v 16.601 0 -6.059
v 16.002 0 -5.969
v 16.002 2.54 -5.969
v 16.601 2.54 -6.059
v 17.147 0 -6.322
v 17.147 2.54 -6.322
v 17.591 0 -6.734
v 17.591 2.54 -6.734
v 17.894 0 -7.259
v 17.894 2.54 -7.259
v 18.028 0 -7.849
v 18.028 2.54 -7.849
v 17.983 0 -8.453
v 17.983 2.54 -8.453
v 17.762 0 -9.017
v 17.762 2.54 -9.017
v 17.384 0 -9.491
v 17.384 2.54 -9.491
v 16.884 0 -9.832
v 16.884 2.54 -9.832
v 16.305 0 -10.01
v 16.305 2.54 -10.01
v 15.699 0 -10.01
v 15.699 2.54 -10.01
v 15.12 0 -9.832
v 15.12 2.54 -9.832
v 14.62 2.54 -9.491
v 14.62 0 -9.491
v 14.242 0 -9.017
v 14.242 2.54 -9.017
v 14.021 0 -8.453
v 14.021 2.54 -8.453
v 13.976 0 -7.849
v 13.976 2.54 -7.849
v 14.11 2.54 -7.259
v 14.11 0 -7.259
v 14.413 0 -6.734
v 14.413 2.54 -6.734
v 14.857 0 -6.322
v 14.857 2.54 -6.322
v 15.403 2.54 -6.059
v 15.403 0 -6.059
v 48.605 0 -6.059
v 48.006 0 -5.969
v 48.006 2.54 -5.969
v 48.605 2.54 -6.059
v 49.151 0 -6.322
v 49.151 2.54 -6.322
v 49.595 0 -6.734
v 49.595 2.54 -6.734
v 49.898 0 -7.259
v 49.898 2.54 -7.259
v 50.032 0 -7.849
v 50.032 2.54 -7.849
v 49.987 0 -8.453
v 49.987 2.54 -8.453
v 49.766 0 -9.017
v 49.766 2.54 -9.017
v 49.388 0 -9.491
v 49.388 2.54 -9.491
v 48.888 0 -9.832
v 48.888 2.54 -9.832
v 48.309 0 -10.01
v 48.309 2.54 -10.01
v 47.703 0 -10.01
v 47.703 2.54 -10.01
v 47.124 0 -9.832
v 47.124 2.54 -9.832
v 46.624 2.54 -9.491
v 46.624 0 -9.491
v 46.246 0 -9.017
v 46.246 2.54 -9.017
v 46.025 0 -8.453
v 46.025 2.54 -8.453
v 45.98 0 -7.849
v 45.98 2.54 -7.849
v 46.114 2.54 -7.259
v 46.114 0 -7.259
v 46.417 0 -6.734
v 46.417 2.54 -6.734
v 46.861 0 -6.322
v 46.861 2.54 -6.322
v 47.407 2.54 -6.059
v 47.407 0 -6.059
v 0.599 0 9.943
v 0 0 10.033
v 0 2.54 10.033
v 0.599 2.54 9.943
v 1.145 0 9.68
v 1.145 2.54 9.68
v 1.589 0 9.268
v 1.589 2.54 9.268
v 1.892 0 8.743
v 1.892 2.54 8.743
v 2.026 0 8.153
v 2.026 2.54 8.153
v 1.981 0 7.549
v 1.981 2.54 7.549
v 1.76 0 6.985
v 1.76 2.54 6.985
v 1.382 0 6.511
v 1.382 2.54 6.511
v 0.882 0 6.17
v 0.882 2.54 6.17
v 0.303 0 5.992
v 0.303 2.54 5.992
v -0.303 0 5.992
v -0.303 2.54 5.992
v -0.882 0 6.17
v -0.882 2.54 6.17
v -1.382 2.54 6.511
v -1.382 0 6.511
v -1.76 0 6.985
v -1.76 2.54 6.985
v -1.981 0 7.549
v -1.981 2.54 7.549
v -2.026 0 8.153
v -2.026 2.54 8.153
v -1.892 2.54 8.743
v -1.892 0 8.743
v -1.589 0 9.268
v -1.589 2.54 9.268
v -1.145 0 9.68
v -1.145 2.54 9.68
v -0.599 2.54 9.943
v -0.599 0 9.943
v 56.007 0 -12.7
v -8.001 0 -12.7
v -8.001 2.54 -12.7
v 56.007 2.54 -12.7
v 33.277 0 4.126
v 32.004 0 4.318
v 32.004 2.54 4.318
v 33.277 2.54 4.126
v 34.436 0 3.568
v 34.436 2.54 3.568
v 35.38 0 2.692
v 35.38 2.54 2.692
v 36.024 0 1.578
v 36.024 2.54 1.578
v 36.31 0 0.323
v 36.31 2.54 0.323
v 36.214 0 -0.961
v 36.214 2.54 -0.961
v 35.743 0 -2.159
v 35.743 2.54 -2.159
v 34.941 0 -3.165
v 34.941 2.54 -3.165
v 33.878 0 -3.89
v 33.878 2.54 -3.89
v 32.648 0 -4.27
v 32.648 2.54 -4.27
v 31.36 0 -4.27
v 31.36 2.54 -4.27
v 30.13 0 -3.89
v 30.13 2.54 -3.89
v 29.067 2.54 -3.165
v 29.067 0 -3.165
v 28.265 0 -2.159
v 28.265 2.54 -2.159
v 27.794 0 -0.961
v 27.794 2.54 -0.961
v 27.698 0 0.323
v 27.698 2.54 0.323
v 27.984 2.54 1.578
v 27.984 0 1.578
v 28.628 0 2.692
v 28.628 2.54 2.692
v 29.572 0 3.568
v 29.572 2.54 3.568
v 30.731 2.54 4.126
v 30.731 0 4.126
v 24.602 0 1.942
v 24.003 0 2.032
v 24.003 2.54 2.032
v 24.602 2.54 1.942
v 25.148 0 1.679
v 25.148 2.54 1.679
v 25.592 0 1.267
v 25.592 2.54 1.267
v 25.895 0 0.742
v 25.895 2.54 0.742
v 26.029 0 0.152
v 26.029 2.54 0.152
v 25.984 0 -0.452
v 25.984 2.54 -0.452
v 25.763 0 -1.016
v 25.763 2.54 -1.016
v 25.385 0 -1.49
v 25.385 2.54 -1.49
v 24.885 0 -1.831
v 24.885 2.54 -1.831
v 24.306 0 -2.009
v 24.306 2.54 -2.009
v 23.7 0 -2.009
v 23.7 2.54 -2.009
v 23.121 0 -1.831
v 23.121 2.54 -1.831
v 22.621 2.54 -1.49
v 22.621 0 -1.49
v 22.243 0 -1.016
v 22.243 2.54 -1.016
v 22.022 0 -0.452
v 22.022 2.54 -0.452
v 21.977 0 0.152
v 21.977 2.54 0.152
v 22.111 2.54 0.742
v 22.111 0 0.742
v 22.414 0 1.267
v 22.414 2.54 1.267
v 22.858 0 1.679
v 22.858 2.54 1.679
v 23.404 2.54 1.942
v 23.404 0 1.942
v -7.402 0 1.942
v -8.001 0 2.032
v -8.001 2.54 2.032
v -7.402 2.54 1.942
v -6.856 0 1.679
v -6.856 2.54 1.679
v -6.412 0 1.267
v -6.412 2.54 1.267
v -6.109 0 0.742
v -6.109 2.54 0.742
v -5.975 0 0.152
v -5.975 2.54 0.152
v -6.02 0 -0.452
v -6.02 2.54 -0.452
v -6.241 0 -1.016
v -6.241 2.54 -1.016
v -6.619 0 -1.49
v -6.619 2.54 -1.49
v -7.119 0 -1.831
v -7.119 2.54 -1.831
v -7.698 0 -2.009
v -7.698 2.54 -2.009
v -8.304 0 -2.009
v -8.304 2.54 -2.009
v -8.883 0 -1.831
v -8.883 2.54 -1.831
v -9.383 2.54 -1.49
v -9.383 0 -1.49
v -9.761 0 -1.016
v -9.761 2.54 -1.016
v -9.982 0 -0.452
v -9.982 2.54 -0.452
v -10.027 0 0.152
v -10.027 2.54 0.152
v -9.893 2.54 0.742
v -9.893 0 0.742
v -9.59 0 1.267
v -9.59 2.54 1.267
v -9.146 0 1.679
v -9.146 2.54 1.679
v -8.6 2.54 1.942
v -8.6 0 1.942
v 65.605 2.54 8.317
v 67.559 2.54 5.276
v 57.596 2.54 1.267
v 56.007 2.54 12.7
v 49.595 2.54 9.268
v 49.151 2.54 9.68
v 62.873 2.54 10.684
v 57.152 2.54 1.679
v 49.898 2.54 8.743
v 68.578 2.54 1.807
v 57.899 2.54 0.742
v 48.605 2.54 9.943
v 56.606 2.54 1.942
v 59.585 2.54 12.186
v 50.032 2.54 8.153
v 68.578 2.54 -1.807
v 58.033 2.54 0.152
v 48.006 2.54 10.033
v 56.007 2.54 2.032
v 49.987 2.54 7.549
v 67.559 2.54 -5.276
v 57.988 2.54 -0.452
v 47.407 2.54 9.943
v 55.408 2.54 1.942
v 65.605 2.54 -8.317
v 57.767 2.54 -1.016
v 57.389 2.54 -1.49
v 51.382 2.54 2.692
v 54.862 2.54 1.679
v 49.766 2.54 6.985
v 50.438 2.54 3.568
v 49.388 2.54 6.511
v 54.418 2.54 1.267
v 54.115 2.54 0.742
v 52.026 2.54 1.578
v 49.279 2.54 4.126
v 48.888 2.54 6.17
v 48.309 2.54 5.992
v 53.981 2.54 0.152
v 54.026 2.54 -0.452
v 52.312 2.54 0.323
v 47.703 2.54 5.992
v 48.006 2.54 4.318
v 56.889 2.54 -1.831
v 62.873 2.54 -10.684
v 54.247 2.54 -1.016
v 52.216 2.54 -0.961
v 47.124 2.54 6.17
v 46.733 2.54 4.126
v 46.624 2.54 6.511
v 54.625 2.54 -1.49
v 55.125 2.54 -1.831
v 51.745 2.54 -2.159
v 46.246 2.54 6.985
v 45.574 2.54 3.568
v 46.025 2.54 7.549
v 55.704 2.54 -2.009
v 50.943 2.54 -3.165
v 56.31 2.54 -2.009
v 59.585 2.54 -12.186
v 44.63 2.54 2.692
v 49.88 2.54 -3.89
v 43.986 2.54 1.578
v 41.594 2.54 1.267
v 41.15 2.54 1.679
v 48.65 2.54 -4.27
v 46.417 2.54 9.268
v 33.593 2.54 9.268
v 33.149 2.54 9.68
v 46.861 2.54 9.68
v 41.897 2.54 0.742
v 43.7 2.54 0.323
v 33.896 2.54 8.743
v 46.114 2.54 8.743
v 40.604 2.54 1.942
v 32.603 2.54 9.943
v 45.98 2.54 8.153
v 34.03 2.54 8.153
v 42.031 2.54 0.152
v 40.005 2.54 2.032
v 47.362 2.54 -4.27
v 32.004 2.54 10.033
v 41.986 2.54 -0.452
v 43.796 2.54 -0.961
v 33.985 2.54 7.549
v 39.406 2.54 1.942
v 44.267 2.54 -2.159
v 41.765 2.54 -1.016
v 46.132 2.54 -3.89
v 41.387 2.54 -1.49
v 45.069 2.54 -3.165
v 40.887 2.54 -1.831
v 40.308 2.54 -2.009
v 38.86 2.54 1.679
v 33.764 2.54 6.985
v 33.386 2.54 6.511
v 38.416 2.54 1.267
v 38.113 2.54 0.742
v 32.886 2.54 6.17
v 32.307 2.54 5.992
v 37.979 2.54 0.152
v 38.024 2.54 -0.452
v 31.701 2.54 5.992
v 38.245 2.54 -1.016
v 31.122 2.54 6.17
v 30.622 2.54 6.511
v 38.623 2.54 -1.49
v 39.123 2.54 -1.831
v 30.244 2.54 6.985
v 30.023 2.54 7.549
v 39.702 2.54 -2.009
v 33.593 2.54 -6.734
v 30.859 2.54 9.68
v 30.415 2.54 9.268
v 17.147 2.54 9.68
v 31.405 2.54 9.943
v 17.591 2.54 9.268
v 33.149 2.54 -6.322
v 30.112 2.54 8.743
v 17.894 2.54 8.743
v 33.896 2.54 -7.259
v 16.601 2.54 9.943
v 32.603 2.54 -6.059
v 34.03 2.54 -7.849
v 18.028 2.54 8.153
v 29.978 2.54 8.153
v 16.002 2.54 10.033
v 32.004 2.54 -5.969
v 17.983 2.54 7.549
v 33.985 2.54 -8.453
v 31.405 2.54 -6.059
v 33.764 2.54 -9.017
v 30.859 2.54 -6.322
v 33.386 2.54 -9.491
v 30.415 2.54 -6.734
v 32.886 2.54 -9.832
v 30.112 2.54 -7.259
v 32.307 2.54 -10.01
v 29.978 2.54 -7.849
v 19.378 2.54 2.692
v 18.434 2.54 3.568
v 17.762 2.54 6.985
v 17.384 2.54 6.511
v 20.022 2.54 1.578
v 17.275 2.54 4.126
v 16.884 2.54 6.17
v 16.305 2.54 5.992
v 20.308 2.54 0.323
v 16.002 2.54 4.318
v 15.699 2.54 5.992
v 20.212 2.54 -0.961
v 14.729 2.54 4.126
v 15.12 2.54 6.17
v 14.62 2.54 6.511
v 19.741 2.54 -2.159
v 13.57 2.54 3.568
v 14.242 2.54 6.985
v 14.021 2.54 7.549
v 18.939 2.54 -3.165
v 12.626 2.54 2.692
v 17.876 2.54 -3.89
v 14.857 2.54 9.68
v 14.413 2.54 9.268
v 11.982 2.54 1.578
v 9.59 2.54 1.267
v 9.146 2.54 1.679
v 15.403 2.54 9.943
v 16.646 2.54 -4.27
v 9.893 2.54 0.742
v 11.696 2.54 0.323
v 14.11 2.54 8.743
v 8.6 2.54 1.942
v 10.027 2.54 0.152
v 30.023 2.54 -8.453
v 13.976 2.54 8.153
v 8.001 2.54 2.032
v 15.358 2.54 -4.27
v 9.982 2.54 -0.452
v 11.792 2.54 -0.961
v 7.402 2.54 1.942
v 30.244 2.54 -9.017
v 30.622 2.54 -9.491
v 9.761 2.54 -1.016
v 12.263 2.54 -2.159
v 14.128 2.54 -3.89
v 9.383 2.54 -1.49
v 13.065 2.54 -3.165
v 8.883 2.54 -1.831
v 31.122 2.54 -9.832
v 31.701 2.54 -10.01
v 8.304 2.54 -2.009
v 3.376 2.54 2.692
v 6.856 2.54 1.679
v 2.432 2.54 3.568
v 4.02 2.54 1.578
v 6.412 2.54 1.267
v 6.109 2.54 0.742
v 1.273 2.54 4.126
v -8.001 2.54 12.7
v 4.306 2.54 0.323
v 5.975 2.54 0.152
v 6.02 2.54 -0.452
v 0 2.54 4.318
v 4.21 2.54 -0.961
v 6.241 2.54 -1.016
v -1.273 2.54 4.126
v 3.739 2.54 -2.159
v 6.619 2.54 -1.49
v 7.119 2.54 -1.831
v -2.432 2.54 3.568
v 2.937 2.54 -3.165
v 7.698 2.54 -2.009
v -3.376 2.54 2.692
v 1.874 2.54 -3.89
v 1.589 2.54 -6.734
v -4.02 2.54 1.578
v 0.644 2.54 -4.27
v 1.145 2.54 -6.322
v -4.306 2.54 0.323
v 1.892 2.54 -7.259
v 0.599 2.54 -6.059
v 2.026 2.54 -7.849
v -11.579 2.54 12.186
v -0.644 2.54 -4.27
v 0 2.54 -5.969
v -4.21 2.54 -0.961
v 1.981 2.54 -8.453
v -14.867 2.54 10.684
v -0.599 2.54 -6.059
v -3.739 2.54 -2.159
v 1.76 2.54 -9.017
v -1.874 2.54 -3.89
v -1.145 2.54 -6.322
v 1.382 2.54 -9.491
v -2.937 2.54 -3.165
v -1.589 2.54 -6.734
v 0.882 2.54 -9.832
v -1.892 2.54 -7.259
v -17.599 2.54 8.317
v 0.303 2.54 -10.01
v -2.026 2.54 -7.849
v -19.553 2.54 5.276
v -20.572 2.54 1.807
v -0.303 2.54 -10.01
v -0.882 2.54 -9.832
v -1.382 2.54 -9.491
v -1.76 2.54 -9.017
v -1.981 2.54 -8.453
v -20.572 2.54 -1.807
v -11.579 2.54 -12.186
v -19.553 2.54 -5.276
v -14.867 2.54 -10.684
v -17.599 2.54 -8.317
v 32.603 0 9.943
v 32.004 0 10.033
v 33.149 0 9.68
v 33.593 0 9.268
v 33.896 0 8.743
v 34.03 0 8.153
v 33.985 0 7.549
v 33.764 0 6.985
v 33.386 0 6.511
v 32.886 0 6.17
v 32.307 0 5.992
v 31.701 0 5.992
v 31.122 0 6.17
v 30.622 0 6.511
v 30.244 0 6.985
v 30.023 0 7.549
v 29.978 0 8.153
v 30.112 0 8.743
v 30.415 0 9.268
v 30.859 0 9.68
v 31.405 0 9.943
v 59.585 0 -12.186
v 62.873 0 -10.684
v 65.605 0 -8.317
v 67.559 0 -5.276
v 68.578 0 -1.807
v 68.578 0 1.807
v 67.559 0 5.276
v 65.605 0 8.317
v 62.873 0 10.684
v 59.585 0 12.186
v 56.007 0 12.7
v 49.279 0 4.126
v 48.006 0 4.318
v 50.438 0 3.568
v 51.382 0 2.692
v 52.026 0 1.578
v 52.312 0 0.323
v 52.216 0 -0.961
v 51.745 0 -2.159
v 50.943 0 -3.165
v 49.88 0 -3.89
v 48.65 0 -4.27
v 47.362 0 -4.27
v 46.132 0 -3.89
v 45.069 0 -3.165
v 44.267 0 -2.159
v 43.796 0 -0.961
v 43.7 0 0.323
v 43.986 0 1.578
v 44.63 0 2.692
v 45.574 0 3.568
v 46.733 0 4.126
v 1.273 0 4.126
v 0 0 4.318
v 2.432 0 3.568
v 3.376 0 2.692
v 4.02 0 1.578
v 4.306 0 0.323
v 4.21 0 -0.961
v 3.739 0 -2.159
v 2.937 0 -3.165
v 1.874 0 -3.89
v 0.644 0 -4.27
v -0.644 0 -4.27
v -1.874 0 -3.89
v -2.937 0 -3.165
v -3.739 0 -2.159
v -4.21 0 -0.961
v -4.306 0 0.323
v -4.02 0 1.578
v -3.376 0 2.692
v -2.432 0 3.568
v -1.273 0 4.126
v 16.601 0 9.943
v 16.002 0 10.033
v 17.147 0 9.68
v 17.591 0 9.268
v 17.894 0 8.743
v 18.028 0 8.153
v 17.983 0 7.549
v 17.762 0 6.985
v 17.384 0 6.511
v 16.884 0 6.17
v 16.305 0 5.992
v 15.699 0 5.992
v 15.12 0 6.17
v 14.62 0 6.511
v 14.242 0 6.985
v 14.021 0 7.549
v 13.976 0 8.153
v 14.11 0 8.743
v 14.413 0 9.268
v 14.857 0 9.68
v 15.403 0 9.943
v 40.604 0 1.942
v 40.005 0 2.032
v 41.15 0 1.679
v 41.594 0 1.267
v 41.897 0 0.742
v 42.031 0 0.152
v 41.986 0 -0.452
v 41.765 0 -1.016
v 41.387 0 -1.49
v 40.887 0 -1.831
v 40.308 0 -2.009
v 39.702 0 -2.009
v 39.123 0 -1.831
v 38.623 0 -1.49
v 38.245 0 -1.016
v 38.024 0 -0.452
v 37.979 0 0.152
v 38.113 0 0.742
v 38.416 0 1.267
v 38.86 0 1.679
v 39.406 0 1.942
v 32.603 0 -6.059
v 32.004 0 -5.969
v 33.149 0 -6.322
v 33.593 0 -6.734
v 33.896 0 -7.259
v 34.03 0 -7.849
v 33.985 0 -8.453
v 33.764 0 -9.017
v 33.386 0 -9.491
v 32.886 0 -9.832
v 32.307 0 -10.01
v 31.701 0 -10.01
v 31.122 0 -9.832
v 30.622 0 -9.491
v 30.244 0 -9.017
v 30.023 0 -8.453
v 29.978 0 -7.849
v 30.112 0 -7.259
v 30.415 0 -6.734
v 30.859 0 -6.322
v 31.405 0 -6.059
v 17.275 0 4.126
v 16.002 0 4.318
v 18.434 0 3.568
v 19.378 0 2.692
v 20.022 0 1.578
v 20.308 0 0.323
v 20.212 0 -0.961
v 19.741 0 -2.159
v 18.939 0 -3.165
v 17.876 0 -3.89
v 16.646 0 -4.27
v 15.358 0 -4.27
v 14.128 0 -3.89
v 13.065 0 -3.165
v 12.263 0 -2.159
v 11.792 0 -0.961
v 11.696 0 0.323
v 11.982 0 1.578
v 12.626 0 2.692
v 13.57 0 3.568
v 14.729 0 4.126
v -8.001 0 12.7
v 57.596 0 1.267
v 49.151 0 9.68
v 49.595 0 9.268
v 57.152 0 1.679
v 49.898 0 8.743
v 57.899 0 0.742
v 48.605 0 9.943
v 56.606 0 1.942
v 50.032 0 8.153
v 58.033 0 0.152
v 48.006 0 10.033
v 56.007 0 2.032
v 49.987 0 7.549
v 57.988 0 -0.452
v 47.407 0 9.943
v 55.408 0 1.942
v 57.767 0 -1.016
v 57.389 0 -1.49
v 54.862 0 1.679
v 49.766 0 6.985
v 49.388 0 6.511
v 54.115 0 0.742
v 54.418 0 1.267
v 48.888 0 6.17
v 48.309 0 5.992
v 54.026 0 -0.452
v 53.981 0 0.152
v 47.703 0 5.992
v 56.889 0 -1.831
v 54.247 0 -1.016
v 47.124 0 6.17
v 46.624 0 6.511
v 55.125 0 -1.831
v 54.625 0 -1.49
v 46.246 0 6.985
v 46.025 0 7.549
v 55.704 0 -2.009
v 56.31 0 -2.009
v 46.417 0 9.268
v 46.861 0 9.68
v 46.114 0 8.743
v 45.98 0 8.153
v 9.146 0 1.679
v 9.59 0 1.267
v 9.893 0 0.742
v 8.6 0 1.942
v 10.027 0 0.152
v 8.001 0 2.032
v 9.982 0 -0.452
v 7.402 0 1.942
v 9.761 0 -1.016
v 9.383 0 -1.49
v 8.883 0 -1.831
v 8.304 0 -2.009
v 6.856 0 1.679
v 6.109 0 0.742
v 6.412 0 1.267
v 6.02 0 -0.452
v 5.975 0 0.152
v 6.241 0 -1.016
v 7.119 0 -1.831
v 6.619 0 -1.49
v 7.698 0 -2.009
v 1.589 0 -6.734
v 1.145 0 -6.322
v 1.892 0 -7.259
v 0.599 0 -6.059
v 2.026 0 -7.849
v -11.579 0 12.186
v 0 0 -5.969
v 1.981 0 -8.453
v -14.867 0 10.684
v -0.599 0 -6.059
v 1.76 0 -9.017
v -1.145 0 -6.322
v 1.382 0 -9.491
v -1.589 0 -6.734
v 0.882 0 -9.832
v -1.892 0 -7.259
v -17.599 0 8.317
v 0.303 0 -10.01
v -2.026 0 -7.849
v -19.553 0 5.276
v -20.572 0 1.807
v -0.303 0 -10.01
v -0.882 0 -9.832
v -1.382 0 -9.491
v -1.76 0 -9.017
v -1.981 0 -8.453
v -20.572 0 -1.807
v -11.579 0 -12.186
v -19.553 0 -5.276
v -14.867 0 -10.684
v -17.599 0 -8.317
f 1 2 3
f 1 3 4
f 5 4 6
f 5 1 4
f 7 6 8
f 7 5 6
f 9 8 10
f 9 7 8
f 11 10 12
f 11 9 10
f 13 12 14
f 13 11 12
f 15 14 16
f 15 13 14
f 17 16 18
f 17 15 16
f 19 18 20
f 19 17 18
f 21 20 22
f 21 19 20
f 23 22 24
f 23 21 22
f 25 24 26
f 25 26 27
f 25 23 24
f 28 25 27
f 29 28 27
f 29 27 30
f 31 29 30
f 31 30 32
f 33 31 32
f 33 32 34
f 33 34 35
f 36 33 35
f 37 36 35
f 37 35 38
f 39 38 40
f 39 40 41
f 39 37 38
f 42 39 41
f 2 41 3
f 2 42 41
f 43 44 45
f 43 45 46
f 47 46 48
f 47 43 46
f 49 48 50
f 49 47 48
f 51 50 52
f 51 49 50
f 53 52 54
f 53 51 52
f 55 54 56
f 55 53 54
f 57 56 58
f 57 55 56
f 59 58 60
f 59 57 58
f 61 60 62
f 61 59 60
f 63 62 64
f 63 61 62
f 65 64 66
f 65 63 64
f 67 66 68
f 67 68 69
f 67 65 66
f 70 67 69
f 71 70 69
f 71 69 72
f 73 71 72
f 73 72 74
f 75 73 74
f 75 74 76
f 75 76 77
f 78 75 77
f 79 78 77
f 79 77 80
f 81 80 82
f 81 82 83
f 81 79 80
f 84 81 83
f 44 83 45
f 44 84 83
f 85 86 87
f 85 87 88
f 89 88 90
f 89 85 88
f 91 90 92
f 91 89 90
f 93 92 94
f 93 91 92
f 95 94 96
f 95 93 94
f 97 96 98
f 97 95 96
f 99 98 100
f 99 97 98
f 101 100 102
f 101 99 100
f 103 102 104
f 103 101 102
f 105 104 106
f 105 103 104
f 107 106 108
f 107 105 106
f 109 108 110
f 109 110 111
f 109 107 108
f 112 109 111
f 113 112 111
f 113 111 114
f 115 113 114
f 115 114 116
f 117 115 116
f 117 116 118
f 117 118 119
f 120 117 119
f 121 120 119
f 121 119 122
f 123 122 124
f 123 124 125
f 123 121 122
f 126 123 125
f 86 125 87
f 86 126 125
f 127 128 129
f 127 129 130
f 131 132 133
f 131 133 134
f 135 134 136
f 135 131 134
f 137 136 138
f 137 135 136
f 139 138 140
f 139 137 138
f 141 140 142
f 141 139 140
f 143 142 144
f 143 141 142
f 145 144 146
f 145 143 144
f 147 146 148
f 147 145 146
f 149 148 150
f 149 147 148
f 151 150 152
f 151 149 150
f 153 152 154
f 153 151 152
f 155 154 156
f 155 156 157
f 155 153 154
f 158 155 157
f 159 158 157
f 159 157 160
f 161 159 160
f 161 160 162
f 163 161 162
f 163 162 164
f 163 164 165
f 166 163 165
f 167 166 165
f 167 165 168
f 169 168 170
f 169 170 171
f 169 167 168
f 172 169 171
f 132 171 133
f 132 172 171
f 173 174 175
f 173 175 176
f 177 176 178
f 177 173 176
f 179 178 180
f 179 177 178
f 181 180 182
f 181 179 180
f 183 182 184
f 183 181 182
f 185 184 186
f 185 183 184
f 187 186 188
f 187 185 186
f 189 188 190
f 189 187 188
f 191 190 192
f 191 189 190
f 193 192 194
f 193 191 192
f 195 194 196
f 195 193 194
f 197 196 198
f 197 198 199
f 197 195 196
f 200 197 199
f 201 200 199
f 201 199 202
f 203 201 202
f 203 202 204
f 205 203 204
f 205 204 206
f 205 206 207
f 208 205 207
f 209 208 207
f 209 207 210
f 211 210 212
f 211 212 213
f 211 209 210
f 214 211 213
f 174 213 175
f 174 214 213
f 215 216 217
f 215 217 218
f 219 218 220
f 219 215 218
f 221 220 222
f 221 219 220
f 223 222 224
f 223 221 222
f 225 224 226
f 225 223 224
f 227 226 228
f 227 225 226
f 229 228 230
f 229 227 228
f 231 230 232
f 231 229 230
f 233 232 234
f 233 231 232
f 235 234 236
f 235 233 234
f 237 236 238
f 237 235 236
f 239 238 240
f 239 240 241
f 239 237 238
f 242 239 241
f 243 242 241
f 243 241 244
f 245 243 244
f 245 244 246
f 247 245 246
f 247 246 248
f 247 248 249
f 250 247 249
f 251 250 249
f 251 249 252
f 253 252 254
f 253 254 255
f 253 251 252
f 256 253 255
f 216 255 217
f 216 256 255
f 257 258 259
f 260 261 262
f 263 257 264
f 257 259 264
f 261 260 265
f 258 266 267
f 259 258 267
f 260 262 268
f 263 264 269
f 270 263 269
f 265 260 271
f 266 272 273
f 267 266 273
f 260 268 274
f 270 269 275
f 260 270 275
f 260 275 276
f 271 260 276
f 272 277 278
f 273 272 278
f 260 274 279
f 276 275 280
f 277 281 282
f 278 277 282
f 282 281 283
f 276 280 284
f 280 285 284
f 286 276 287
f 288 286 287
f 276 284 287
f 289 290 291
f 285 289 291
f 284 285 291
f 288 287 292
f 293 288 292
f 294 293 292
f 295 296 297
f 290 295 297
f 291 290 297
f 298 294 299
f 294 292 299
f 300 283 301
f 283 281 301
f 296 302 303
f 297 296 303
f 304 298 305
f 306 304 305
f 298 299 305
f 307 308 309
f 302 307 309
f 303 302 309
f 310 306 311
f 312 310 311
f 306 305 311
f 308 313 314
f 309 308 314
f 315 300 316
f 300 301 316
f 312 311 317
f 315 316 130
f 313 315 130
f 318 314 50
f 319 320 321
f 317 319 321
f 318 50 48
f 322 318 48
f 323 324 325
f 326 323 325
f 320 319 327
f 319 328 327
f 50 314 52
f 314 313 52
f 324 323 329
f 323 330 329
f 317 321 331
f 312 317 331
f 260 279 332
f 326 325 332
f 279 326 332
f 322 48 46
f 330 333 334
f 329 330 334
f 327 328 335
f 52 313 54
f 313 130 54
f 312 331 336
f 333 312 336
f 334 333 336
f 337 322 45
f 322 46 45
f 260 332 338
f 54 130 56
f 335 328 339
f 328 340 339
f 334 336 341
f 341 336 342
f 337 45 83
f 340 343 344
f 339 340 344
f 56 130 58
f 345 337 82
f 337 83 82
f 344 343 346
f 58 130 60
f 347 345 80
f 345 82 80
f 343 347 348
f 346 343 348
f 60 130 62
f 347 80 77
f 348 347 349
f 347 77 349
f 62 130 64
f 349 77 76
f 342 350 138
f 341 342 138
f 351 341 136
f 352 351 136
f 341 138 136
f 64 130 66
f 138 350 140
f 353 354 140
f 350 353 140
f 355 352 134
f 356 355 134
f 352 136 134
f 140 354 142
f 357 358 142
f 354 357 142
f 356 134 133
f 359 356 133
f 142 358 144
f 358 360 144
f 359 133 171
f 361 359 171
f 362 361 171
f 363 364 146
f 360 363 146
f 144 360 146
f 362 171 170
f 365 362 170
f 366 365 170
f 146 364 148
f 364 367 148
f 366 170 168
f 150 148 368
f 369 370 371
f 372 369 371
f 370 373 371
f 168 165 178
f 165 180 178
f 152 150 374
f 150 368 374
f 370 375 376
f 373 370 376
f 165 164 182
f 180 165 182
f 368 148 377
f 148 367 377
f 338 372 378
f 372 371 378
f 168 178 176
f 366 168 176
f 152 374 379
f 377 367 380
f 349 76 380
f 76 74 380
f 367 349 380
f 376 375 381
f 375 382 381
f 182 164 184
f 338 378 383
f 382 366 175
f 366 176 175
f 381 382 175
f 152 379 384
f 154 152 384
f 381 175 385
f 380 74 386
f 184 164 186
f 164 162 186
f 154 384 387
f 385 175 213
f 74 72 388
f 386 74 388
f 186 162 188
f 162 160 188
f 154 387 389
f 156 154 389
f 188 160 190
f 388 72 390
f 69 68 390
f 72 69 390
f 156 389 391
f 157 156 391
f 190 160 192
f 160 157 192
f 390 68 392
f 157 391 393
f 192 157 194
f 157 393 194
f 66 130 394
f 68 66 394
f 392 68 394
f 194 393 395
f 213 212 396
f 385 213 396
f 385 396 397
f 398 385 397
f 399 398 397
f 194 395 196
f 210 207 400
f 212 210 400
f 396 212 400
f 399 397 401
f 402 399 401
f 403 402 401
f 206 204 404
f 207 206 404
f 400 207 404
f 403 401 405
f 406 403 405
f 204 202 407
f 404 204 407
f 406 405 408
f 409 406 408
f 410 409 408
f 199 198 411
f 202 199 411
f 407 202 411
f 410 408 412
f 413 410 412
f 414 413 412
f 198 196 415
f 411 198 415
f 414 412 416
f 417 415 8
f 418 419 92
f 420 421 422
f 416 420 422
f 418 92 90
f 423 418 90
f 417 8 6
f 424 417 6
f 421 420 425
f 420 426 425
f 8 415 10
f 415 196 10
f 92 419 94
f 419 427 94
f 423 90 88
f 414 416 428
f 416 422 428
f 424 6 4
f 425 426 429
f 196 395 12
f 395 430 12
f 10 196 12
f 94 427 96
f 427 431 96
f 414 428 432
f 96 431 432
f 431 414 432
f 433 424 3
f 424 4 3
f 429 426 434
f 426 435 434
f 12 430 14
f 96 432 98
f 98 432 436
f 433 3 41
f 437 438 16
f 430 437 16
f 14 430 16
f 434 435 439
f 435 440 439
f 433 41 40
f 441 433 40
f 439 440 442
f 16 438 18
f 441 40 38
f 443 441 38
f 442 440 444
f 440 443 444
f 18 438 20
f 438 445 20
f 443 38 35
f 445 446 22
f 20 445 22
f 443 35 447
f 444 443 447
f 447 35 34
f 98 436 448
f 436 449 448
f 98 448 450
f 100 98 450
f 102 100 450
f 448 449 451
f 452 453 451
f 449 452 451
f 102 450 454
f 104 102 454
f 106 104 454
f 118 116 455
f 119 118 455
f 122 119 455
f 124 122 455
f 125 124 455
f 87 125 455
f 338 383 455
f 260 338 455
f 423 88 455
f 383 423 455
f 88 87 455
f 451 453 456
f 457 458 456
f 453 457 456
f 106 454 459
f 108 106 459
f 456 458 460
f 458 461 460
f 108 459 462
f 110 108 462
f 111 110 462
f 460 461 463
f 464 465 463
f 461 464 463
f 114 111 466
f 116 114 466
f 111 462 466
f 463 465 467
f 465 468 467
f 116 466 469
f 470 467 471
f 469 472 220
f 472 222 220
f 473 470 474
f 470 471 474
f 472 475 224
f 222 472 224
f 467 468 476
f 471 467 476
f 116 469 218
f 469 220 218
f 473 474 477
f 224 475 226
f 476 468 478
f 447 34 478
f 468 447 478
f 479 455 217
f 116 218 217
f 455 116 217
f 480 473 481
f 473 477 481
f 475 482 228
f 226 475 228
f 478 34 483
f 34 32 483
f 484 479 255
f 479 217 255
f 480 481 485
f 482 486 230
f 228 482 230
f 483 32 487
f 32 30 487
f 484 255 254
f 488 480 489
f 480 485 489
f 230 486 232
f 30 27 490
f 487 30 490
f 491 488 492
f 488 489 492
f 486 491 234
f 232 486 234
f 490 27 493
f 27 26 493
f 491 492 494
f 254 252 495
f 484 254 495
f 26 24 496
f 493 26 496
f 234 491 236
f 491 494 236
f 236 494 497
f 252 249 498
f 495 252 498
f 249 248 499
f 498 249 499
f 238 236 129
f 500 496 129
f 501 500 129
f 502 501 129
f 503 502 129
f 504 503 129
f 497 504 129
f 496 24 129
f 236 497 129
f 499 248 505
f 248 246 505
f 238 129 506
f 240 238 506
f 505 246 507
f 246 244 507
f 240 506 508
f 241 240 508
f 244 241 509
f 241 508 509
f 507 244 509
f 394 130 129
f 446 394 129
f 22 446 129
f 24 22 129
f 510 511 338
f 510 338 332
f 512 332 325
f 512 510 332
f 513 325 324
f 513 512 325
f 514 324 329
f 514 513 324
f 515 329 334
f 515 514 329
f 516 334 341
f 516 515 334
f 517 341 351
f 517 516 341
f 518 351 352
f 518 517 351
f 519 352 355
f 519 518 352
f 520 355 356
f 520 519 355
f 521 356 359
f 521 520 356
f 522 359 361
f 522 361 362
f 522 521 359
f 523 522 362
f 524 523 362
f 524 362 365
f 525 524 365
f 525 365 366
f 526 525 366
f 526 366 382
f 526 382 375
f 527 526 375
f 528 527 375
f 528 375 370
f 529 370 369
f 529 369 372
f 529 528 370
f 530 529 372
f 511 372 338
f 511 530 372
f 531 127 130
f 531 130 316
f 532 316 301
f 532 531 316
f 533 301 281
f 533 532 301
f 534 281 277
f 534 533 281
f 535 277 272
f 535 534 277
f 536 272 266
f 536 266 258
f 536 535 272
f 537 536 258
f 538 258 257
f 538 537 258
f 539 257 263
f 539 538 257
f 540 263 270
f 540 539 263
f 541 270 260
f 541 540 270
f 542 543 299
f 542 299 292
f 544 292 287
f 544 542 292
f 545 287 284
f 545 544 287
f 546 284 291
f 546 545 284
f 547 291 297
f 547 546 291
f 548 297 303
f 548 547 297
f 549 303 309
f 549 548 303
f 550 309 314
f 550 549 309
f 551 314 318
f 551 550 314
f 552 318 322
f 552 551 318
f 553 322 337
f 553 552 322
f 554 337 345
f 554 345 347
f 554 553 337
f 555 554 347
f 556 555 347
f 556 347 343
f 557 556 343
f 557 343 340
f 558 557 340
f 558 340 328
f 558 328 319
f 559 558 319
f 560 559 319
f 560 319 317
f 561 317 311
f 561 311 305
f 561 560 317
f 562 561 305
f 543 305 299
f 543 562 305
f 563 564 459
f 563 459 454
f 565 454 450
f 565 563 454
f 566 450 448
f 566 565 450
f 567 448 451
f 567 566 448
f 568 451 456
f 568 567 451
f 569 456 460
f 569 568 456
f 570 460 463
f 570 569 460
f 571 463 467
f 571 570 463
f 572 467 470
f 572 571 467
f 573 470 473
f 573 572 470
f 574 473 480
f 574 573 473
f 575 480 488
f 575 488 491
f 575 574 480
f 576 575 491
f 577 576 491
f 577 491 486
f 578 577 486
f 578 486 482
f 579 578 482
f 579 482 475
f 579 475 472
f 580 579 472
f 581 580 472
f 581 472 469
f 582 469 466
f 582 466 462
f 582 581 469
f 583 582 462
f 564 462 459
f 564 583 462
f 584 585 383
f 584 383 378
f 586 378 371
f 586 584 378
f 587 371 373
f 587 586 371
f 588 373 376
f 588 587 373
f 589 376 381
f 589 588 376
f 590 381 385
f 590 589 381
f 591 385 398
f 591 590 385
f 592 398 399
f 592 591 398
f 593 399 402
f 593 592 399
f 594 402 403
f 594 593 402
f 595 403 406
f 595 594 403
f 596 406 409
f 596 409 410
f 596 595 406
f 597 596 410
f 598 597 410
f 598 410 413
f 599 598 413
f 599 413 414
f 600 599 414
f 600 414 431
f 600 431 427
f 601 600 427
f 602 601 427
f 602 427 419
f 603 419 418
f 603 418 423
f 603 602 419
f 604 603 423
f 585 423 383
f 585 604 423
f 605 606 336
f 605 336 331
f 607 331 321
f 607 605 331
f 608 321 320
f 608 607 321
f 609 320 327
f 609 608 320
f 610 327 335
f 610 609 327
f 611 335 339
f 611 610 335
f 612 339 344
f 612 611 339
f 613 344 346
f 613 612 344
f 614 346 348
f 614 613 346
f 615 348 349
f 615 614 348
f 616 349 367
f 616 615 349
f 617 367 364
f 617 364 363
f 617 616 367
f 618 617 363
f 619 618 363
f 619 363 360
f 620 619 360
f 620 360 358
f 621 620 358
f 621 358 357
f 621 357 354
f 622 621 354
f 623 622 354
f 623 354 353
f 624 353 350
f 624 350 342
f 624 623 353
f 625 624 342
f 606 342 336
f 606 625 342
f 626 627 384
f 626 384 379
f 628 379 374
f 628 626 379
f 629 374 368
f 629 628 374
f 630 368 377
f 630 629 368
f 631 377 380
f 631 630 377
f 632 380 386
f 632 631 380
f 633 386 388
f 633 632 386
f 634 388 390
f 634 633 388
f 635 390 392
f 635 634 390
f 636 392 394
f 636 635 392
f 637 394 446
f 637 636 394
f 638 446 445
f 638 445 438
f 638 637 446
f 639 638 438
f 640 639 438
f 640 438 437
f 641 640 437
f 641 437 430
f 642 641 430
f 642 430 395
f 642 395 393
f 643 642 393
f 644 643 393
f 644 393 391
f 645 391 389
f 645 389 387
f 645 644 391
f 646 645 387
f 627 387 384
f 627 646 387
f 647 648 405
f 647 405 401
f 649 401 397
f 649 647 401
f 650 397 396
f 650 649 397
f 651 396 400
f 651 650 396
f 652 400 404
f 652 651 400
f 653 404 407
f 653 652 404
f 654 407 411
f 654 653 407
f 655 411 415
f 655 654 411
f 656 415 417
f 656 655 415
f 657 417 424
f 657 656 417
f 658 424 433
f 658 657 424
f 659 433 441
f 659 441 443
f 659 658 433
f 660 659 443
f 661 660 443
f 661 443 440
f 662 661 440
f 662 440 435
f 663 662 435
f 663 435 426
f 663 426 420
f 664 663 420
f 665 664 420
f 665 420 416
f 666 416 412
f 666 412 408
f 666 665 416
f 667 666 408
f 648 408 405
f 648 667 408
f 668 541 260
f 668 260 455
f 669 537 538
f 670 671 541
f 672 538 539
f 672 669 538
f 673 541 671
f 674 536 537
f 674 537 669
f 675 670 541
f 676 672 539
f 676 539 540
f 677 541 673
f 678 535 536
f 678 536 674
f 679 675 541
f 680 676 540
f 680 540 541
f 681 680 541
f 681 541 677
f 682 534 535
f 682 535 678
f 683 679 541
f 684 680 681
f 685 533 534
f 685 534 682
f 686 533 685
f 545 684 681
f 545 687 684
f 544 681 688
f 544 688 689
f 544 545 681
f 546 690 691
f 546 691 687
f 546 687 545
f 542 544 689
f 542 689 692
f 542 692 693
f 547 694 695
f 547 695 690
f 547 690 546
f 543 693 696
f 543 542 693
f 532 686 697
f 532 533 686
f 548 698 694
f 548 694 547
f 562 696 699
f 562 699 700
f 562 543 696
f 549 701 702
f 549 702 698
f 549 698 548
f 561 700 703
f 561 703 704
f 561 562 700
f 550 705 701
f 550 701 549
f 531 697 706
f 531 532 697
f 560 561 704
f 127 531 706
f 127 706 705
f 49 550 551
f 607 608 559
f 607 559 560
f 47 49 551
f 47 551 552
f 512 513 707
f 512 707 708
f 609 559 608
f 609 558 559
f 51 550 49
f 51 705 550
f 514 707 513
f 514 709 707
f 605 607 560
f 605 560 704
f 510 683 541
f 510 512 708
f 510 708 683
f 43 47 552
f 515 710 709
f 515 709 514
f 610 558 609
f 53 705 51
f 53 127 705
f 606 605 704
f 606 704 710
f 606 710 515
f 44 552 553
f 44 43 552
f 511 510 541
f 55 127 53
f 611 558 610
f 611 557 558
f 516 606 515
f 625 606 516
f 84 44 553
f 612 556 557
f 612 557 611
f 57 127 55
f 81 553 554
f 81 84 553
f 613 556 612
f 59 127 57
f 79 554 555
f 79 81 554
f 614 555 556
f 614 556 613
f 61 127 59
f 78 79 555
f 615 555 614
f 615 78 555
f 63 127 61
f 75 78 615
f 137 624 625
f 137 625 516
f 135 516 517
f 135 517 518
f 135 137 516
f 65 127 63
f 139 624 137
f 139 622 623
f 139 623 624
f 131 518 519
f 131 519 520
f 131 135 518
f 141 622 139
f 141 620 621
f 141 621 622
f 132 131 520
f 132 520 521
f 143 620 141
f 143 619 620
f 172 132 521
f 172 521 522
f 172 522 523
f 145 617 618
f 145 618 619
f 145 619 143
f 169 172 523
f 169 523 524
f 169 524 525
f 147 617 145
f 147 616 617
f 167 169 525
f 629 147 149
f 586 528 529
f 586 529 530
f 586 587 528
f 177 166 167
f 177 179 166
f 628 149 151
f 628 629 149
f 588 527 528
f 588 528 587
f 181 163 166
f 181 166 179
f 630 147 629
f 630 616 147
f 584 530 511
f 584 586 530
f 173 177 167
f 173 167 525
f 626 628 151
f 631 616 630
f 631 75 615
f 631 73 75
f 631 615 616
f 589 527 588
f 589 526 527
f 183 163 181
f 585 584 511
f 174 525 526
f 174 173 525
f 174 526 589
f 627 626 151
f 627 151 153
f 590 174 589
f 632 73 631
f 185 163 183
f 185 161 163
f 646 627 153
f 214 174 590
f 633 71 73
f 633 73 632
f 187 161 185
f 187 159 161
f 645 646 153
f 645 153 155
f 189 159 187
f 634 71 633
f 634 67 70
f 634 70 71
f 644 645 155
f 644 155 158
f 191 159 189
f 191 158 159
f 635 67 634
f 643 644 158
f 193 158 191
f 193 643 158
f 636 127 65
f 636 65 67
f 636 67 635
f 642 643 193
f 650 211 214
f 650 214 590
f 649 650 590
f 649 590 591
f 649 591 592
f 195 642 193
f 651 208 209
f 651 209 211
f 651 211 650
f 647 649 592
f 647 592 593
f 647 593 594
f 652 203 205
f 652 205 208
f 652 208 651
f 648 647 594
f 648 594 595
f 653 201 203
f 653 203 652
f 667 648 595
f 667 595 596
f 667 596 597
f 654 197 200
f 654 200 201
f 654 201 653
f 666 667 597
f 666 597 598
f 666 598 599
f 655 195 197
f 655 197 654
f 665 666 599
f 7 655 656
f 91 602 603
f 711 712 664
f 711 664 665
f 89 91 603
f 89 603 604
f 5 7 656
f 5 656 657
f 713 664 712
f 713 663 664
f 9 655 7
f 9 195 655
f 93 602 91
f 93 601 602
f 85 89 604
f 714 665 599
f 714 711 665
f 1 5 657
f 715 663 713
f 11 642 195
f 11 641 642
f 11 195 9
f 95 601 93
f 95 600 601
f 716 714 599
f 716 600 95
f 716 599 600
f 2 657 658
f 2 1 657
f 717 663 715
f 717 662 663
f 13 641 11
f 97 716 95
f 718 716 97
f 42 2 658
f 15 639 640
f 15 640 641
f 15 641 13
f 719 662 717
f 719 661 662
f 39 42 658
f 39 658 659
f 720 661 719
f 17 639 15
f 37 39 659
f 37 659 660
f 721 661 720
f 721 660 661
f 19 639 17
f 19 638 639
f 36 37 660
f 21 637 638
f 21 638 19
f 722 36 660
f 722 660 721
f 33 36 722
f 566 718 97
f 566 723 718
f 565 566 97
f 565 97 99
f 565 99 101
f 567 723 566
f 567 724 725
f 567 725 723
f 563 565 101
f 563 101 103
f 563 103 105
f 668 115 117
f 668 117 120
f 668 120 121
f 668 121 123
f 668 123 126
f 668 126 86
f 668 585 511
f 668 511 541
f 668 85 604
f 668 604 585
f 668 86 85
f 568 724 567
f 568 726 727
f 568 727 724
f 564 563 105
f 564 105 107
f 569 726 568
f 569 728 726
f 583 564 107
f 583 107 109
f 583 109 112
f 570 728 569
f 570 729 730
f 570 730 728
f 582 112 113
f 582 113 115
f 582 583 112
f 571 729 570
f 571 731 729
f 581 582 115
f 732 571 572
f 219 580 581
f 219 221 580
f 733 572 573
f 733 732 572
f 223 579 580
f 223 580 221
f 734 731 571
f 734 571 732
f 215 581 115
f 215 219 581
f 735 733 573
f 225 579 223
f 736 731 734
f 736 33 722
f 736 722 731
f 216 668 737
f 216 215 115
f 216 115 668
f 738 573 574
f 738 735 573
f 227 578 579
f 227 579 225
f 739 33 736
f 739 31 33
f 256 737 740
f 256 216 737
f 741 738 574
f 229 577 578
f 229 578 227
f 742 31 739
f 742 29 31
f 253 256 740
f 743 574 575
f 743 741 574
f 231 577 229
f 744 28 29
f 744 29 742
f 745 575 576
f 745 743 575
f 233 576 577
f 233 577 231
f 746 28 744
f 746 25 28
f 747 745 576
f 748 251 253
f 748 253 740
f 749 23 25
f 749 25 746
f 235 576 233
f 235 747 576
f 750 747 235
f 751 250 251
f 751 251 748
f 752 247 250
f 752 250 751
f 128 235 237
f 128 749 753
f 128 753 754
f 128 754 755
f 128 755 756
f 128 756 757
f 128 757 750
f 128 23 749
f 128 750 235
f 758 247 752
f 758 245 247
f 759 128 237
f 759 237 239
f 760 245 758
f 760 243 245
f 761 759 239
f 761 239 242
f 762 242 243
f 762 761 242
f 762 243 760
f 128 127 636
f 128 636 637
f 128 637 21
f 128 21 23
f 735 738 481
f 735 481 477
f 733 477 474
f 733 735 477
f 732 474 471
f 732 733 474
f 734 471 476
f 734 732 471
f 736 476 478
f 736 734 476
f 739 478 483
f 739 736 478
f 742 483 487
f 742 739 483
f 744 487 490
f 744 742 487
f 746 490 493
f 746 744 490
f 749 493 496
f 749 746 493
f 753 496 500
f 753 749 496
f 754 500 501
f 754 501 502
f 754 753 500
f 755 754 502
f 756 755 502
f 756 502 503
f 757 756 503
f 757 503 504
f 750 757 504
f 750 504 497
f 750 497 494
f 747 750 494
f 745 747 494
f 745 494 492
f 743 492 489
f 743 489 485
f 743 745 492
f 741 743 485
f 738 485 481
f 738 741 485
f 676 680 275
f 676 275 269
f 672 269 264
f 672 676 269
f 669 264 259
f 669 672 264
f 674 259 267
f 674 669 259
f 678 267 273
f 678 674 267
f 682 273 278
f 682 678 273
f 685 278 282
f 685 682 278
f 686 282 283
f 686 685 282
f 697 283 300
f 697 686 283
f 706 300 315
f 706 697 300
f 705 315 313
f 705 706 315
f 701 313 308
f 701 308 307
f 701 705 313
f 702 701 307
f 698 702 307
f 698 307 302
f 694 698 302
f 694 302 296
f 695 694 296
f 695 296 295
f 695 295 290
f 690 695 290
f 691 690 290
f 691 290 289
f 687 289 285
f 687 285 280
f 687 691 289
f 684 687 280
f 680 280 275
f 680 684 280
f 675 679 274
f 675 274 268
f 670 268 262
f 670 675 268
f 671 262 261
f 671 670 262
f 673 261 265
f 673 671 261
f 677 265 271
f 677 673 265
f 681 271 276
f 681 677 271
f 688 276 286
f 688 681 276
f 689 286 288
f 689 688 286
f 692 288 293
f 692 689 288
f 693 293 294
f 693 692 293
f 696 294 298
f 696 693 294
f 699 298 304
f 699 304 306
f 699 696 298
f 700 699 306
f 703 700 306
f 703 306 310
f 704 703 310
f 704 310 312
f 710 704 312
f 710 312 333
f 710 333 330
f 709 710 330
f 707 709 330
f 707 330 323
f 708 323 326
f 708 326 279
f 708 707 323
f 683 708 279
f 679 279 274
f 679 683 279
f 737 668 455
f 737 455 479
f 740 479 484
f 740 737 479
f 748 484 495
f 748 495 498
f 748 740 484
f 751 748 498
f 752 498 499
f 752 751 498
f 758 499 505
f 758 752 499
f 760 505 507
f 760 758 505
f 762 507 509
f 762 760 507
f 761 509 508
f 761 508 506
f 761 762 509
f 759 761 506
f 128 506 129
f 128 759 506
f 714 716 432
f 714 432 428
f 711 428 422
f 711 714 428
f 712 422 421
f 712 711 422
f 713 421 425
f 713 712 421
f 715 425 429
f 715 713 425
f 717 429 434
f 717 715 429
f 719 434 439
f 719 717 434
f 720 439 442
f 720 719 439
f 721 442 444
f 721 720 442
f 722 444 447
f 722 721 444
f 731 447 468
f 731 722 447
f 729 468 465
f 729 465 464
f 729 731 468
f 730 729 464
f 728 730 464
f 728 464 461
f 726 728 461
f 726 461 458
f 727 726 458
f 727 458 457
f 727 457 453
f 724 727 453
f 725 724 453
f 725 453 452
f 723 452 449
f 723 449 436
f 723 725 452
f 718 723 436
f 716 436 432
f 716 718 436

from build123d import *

# Parameters (mm, degrees)
SKETCH2_R           = 2.032
SKETCH2_R_2         = 4.318
BOSS_EXTRUDE1_DEPTH = 2.54


with BuildPart() as part:
    # Sketch2 → Boss-Extrude1 (new body)
    with BuildSketch(Plane(origin=(0, 0, 0), x_dir=(1, 0, 0), z_dir=(0, 1, 0))):
        with BuildLine():
            Line((56.007, 12.7), (-8.001, 12.7))
            ThreePointArc((-8.001, 12.7), (-20.701, 0), (-8.001, -12.7))
            Line((-8.001, -12.7), (56.007, -12.7))
            ThreePointArc((56.007, -12.7), (68.707, 0), (56.007, 12.7))
        make_face()
        with Locations((0, -8.001)):
            Circle(SKETCH2_R, mode=Mode.SUBTRACT)
        with Locations((16.002, -8.001)):
            Circle(SKETCH2_R, mode=Mode.SUBTRACT)
        with Locations((-8.001, 0)):
            Circle(SKETCH2_R, mode=Mode.SUBTRACT)
        with Locations((32.004, -8.001)):
            Circle(SKETCH2_R, mode=Mode.SUBTRACT)
        with Locations((48.006, -8.001)):
            Circle(SKETCH2_R, mode=Mode.SUBTRACT)
        with Locations((24.003, 0)):
            Circle(SKETCH2_R, mode=Mode.SUBTRACT)
        with Locations((40.005, 0)):
            Circle(SKETCH2_R, mode=Mode.SUBTRACT)
        with Locations((56.007, 0)):
            Circle(SKETCH2_R, mode=Mode.SUBTRACT)
        Circle(SKETCH2_R_2, mode=Mode.SUBTRACT)
        with Locations((8.001, 0)):
            Circle(SKETCH2_R, mode=Mode.SUBTRACT)
        with Locations((16.002, 0)):
            Circle(SKETCH2_R_2, mode=Mode.SUBTRACT)
        with Locations((0, 8.001)):
            Circle(SKETCH2_R, mode=Mode.SUBTRACT)
        with Locations((16.002, 8.001)):
            Circle(SKETCH2_R, mode=Mode.SUBTRACT)
        with Locations((32.004, 0)):
            Circle(SKETCH2_R_2, mode=Mode.SUBTRACT)
        with Locations((48.006, 0)):
            Circle(SKETCH2_R_2, mode=Mode.SUBTRACT)
        with Locations((32.004, 8.001)):
            Circle(SKETCH2_R, mode=Mode.SUBTRACT)
        with Locations((48.006, 8.001)):
            Circle(SKETCH2_R, mode=Mode.SUBTRACT)
    extrude(amount=BOSS_EXTRUDE1_DEPTH)


solid = part.part
